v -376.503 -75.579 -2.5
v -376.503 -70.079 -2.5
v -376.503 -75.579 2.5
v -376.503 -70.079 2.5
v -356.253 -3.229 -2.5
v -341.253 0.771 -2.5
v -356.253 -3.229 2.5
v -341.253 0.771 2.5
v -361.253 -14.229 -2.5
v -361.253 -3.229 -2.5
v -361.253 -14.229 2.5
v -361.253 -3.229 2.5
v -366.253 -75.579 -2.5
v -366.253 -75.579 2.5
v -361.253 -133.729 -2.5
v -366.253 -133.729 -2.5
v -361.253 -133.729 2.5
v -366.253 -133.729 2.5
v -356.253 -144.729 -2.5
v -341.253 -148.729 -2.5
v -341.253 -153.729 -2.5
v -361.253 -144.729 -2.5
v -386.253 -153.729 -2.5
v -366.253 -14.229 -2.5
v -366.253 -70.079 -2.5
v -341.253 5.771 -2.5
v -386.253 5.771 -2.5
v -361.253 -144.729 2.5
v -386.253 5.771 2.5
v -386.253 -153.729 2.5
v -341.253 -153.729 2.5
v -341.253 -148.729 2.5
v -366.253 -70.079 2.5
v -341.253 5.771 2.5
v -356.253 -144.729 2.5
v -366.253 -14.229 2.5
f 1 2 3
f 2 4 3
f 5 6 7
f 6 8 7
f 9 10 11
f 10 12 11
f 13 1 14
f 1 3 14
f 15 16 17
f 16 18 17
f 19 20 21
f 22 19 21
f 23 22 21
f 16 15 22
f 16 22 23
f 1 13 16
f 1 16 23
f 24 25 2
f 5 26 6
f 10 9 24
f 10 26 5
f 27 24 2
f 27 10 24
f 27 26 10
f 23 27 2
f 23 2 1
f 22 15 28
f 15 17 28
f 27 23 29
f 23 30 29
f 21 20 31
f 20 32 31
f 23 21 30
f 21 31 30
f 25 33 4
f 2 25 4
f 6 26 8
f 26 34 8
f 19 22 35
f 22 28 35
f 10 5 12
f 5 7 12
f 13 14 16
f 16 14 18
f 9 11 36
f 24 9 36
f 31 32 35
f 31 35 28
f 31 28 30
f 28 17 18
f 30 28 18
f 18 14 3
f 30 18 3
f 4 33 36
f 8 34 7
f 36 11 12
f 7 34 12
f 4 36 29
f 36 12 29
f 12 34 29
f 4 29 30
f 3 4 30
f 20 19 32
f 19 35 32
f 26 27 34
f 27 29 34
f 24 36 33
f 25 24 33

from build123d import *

# Parameters (mm, degrees)
BOSS_EXTRUDE1_DEPTH = 2.5


with BuildPart() as part:
    # Sketch2 → Boss-Extrude1 (new, symmetric)
    with BuildSketch(Plane.XY):
        Polygon((-366.252975542, -70.079481859), (-376.502975542, -70.079481859), (-376.502975542, -75.579481859), (-366.252975542, -75.579481859), (-366.252975542, -133.729086599), (-361.252975542, -133.729086599), (-361.252975542, -144.729086599), (-356.252975542, -144.729086599), (-341.252975542, -148.729086599), (-341.252975542, -153.729086599), (-386.252975542, -153.729086599), (-386.252975542, 5.770882486), (-341.252975542, 5.770882486), (-341.252975542, 0.770882486), (-356.252975542, -3.229117514), (-361.252975542, -3.229117514), (-361.252975542, -14.229117514), (-366.252975542, -14.229117514), align=None)
    extrude(amount=BOSS_EXTRUDE1_DEPTH, both=True)


solid = part.part
